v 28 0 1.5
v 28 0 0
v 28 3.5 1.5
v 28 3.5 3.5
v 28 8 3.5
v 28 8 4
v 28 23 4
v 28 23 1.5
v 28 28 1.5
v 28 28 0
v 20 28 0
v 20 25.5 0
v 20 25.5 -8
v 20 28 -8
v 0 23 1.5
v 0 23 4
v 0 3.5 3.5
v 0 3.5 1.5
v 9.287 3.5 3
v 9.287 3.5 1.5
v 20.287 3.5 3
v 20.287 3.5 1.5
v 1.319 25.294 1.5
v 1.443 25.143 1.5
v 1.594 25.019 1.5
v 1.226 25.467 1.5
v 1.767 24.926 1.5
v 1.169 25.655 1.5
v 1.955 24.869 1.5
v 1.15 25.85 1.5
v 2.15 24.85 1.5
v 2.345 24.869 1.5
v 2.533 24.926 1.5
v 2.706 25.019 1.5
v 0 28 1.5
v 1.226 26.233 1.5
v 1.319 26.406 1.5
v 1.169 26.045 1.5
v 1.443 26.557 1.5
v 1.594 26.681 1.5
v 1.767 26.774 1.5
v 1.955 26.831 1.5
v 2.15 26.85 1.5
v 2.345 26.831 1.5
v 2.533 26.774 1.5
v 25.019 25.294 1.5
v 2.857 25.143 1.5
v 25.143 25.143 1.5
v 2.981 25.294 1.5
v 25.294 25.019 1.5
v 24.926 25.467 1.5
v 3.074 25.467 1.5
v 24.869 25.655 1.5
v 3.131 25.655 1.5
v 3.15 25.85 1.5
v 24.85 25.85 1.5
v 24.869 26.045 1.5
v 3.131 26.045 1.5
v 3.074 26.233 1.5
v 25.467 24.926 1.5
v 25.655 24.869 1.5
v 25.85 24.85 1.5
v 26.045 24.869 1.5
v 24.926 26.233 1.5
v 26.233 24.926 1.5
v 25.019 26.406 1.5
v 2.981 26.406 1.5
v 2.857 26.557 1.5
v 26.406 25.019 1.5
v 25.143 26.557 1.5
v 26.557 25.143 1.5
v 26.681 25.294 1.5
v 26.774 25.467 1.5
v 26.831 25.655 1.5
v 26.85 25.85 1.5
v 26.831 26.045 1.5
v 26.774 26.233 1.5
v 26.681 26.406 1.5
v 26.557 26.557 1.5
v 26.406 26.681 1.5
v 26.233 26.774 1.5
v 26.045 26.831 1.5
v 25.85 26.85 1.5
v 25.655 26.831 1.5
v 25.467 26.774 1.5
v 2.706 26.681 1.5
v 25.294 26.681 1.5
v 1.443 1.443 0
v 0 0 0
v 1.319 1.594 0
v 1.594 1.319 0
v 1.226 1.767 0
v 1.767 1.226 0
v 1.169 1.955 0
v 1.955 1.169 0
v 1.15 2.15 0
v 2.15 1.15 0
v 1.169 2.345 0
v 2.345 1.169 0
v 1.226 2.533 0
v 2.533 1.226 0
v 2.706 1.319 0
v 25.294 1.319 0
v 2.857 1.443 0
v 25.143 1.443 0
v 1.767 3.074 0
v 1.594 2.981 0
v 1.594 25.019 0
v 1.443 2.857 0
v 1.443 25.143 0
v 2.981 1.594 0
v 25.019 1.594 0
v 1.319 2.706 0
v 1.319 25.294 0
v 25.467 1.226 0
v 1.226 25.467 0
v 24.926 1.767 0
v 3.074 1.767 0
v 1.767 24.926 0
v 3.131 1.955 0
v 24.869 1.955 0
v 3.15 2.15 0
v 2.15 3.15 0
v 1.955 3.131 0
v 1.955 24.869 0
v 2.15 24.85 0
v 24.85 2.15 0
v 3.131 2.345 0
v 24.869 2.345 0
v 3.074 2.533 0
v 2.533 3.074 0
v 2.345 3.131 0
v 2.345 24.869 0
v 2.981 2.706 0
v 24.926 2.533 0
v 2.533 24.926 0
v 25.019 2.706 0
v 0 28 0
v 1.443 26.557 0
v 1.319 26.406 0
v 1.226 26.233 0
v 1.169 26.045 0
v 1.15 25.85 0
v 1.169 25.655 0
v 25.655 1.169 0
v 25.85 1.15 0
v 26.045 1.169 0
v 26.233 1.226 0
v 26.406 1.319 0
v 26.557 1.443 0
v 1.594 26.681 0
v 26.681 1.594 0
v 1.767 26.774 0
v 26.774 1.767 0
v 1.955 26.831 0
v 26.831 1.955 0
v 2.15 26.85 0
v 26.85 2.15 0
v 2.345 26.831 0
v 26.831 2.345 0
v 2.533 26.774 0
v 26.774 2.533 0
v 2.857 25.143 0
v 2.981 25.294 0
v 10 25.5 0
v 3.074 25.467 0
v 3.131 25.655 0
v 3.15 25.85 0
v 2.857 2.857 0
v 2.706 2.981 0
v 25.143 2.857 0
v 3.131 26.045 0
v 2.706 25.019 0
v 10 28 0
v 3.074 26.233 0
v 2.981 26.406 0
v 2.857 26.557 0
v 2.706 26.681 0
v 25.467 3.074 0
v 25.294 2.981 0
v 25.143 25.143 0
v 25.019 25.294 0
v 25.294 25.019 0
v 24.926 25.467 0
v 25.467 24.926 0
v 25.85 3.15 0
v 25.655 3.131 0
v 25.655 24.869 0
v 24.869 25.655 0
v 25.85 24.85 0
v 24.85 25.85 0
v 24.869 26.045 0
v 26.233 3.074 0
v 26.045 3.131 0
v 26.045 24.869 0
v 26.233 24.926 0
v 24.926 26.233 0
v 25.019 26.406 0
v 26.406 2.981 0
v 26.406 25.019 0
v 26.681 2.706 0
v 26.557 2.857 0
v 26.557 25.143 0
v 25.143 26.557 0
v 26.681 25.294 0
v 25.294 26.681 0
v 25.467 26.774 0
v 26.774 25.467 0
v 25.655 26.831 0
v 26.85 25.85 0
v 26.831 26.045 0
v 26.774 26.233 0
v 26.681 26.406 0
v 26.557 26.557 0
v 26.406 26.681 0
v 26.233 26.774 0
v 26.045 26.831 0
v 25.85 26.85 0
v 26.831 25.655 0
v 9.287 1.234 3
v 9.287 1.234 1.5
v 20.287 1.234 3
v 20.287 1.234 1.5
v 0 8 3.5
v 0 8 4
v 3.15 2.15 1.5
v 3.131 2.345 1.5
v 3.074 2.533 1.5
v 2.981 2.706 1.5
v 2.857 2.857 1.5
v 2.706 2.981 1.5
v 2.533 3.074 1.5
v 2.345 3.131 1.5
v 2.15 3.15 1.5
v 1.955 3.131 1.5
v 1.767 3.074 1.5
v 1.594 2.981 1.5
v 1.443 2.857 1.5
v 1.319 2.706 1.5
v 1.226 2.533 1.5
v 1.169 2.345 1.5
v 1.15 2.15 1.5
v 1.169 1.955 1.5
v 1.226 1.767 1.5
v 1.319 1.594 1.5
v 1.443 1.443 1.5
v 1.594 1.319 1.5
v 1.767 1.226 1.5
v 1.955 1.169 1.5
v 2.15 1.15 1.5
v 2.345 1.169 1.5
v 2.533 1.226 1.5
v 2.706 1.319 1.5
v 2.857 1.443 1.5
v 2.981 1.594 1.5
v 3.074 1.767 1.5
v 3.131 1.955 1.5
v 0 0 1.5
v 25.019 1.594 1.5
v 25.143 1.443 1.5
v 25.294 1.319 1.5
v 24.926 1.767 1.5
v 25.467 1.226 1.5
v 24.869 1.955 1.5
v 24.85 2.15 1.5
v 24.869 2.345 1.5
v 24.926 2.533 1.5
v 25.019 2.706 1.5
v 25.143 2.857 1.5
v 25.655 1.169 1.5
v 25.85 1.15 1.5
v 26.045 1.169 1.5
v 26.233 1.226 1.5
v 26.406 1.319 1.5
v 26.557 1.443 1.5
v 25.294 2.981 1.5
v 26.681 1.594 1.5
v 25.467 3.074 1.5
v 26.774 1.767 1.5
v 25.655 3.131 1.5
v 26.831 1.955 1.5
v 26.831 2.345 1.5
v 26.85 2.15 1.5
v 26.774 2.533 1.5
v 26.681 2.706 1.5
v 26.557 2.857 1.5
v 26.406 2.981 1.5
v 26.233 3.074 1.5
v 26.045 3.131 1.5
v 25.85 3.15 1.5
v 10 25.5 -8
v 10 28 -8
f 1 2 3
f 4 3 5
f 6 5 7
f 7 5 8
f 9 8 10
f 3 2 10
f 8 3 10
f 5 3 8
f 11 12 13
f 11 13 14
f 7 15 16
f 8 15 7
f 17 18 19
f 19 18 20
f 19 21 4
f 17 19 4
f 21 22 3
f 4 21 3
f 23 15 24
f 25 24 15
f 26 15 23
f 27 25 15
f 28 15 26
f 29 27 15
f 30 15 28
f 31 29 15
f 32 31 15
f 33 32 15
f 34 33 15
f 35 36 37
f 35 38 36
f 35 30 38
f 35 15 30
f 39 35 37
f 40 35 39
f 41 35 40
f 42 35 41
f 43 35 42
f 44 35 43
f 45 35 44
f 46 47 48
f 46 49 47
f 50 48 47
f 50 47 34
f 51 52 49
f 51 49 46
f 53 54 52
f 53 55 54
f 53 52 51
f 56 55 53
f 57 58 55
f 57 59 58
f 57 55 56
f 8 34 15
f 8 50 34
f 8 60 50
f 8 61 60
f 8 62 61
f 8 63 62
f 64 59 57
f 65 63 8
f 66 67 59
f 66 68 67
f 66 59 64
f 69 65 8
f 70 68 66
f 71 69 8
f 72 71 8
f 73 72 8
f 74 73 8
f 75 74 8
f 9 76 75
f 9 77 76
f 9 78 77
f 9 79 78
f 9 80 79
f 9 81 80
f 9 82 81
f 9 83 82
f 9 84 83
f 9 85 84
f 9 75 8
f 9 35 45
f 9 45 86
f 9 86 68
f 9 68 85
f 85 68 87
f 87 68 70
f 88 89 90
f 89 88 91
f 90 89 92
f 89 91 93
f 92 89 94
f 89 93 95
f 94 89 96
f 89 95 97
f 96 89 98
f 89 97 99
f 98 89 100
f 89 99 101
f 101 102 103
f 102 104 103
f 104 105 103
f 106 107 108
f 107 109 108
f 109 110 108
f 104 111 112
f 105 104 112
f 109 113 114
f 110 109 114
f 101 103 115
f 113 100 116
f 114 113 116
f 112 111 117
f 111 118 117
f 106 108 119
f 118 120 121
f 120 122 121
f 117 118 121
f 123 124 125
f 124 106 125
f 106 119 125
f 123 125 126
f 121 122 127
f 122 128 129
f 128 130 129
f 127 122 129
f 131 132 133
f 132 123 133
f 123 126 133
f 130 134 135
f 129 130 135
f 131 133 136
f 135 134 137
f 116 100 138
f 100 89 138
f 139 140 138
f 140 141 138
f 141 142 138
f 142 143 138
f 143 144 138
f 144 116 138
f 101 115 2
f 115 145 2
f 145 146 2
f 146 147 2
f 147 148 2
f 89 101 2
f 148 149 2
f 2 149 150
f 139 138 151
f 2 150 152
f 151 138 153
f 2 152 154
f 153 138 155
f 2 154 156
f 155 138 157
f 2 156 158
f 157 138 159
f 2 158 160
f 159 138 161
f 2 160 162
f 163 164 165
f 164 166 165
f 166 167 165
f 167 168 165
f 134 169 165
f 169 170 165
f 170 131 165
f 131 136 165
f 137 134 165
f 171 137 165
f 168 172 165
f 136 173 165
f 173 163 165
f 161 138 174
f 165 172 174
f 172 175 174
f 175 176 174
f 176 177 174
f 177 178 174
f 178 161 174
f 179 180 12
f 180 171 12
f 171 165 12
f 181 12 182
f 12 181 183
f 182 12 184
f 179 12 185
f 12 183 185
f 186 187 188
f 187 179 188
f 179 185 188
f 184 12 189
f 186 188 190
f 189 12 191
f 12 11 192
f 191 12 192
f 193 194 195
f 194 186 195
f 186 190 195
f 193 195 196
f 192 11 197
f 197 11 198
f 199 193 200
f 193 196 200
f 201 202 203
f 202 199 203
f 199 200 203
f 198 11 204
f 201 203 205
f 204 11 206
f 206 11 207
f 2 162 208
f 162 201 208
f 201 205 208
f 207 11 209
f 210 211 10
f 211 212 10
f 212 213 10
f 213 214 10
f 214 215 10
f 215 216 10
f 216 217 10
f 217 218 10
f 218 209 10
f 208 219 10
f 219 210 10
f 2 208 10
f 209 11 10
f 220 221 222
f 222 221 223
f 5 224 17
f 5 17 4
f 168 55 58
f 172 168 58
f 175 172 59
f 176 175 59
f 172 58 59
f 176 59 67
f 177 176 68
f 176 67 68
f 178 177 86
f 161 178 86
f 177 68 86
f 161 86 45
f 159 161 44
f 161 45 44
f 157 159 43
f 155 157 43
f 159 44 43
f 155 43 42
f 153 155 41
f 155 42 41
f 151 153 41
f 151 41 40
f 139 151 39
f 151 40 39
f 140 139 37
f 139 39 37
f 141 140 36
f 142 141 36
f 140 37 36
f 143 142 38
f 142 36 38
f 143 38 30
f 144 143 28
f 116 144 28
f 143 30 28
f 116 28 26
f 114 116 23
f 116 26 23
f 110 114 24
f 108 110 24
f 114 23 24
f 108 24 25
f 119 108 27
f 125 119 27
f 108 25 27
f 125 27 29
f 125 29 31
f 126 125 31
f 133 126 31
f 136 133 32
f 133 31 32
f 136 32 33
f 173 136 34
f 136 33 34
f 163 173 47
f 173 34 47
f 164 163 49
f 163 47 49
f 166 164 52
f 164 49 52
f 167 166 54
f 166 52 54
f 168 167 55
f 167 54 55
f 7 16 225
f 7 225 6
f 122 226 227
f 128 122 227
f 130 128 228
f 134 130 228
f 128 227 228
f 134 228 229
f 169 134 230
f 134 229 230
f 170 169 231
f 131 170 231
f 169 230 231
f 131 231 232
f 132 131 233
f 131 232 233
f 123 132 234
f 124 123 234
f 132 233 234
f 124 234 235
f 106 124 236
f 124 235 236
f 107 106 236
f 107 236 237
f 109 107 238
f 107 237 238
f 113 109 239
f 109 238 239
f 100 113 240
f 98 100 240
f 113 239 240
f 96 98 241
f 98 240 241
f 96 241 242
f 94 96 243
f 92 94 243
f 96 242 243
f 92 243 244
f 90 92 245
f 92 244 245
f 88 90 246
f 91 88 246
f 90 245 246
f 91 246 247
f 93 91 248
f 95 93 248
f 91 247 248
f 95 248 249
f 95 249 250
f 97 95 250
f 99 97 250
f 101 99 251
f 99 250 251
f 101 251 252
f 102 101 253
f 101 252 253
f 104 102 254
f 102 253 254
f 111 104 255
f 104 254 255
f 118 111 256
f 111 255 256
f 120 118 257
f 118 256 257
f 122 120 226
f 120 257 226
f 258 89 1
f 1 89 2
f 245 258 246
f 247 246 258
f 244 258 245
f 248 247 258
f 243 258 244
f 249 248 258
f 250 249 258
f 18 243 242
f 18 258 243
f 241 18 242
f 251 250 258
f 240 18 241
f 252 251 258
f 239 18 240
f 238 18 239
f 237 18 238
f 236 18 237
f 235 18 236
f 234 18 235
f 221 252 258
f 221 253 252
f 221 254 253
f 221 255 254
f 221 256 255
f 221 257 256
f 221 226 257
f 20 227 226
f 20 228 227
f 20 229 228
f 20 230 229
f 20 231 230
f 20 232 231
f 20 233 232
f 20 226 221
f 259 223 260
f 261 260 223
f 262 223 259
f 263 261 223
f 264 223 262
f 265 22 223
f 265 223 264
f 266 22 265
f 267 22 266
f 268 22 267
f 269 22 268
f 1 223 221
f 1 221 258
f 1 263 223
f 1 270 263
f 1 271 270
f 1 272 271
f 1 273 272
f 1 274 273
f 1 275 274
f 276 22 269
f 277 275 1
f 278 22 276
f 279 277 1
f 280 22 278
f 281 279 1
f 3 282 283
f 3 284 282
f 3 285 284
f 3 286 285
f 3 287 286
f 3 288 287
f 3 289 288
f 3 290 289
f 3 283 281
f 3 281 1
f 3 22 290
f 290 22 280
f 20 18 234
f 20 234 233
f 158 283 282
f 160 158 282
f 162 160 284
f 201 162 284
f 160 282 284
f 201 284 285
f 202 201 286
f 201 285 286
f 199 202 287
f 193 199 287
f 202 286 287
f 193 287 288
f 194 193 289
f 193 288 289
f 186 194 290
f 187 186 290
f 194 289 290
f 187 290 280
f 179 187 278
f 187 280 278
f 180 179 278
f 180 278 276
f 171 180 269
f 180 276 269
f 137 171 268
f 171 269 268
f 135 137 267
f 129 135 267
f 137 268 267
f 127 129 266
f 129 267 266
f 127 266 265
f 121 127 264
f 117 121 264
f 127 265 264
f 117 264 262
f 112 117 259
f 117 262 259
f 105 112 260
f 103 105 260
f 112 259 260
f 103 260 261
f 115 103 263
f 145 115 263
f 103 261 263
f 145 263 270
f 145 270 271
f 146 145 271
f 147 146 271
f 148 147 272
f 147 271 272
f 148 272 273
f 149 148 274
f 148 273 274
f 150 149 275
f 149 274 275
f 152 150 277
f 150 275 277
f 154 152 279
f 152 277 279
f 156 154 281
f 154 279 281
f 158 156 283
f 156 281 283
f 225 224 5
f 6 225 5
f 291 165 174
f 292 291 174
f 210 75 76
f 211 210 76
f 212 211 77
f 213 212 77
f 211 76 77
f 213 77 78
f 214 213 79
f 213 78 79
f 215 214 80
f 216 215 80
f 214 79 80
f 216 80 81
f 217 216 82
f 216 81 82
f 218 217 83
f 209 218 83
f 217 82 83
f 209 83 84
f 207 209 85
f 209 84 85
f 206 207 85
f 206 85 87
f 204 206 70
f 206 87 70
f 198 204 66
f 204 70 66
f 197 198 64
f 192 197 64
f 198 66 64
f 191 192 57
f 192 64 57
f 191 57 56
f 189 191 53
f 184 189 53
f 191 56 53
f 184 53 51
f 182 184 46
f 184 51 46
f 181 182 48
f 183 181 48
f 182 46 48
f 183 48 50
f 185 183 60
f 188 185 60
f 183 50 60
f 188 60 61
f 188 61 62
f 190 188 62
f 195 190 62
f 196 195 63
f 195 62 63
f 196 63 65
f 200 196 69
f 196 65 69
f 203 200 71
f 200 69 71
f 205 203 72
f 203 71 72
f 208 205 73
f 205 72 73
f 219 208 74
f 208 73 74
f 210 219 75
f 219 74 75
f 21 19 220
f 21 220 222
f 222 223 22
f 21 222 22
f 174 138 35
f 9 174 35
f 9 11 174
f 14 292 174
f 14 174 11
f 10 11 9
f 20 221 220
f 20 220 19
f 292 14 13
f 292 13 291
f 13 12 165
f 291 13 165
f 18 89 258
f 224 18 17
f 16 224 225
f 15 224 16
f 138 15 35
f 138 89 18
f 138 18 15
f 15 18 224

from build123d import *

# Parameters (mm, degrees)
SKETCH_1_W          = 28
SKETCH_1_H          = 28
EXTRUDE_3_DEPTH     = 1.5
SKETCH_3_W          = 28
SKETCH_3_H          = 19.5
EXTRUDE_4_DEPTH     = 2
SKETCH_5_W          = 28
SKETCH_5_H          = 15
EXTRUDE_5_DEPTH     = 0.5
SKETCH_6_W          = 11
SKETCH_6_H          = 2.266421477
EXTRUDE_6_DEPTH     = 1.5
SKETCH_7_R          = 1
CUT_EXTRUDE_4_DEPTH = 1.5
SKETCH_10_W         = 10
SKETCH_10_H         = 2.5
EXTRUDE_8_DEPTH     = 8


with BuildPart() as part:
    # Эскиз1 → Бобышка-Вытянуть3 (new body)
    with BuildSketch(Plane.XY):
        with Locations((14, 14)):
            Rectangle(SKETCH_1_W, SKETCH_1_H)
    extrude(amount=EXTRUDE_3_DEPTH)

    # Эскиз3 → Бобышка-Вытянуть4 (add)
    with BuildSketch(Plane.XY.offset(1.5)):
        with Locations((14, 13.25)):
            Rectangle(SKETCH_3_W, SKETCH_3_H)
    extrude(amount=EXTRUDE_4_DEPTH)

    # Эскиз5 → Бобышка-Вытянуть5 (add)
    with BuildSketch(Plane.XY.offset(3.5)):
        with Locations((14, 15.5)):
            Rectangle(SKETCH_5_W, SKETCH_5_H)
    extrude(amount=EXTRUDE_5_DEPTH)

    # Эскиз6 → Бобышка-Вытянуть6 (add)
    with BuildSketch(Plane.XY.offset(1.5)):
        with Locations((14.787482479, 2.366789262)):
            Rectangle(SKETCH_6_W, SKETCH_6_H)
    extrude(amount=EXTRUDE_6_DEPTH)

    # Эскиз7 → Вырез-Вытянуть4 (cut)
    with BuildSketch(Plane.XY.offset(1.5)):
        with Locations((2.15, 2.15)):
            Circle(SKETCH_7_R)
        with Locations((2.15, 25.85)):
            Circle(SKETCH_7_R)
        with Locations((25.85, 25.85)):
            Circle(SKETCH_7_R)
        with Locations((25.85, 2.15)):
            Circle(SKETCH_7_R)
    extrude(amount=-CUT_EXTRUDE_4_DEPTH, mode=Mode.SUBTRACT)

    # Эскиз10 → Бобышка-Вытянуть8 (add)
    with BuildSketch(Plane(origin=(0, 0, 0), x_dir=(-1, 0, 0), z_dir=(0, 0, -1))):
        with Locations((-15, 26.75)):
            Rectangle(SKETCH_10_W, SKETCH_10_H)
    extrude(amount=EXTRUDE_8_DEPTH)


solid = part.part
